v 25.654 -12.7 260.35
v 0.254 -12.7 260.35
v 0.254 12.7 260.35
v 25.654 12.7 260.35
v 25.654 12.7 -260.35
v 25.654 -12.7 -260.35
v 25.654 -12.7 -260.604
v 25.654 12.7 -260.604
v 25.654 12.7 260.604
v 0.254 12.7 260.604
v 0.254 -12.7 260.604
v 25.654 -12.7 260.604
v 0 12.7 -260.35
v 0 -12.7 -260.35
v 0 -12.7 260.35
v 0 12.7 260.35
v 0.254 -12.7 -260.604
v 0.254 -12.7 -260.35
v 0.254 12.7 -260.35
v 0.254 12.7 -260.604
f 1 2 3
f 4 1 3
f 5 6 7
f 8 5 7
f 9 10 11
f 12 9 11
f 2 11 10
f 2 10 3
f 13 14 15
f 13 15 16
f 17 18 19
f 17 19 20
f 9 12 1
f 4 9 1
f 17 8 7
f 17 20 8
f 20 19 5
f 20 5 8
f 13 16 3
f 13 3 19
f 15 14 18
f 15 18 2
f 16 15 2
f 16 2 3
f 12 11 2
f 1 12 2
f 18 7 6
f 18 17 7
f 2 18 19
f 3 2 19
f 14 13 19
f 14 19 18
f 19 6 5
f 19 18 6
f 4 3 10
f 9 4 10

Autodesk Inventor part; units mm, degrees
ref_plane "YZ Plane" through (0, 0, 0) normal (1, 0, 0) x (0, 1, 0)
ref_plane "XZ Plane" through (0, 0, 0) normal (0, 1, 0) x (-1, 0, 0)
ref_plane "XY Plane" through (0, 0, 0) normal (0, 0, 1) x (1, 0, 0)
sketch "Sketch1" plane through (0, 0, 0) normal (1, 0, 0) x (0, 1, 0)
  line L0 (-12.7, 260.35) -> (12.7, 260.35)
  line L1 (12.7, 260.35) -> (12.7, -260.35)
  line L2 (12.7, -260.35) -> (-12.7, -260.35)
  line L3 (-12.7, -260.35) -> (-12.7, 260.35)
  line L4 (-12.7, 260.35) -> (12.7, -260.35) construction
  line L5 (12.7, 260.35) -> (-12.7, -260.35) construction
  point P0 (0, 0)
  dimension "d0" = 25.4
  dimension "d1" = 520.7
extrude "Extrusion1" add sketch "Sketch1" along normal blind 0.254
sketch "Sketch2" plane through (0.254, 0, 0) normal (1, 0, 0) x (0, 0, -1)
  line L0 (-260.35, 12.7) -> (-260.604, 12.7)
  line L1 (-260.604, 12.7) -> (-260.604, -12.7)
  line L2 (-260.604, -12.7) -> (-260.35, -12.7)
  line L3 (-260.35, -12.7) -> (-260.35, 12.7)
  line L4 (260.35, 12.7) -> (260.604, 12.7)
  line L5 (260.604, 12.7) -> (260.604, -12.7)
  line L6 (260.604, -12.7) -> (260.35, -12.7)
  line L7 (260.35, -12.7) -> (260.35, 12.7)
  point P0 (0, 0)
  dimension "d4" = 0.254
  dimension "d5" = 25.4
  dimension "d6" = 0.254
  dimension "d7" = 25.4
extrude "Extrusion2" add sketch "Sketch2" along normal blind 25.4
properties part number "Cloth"
